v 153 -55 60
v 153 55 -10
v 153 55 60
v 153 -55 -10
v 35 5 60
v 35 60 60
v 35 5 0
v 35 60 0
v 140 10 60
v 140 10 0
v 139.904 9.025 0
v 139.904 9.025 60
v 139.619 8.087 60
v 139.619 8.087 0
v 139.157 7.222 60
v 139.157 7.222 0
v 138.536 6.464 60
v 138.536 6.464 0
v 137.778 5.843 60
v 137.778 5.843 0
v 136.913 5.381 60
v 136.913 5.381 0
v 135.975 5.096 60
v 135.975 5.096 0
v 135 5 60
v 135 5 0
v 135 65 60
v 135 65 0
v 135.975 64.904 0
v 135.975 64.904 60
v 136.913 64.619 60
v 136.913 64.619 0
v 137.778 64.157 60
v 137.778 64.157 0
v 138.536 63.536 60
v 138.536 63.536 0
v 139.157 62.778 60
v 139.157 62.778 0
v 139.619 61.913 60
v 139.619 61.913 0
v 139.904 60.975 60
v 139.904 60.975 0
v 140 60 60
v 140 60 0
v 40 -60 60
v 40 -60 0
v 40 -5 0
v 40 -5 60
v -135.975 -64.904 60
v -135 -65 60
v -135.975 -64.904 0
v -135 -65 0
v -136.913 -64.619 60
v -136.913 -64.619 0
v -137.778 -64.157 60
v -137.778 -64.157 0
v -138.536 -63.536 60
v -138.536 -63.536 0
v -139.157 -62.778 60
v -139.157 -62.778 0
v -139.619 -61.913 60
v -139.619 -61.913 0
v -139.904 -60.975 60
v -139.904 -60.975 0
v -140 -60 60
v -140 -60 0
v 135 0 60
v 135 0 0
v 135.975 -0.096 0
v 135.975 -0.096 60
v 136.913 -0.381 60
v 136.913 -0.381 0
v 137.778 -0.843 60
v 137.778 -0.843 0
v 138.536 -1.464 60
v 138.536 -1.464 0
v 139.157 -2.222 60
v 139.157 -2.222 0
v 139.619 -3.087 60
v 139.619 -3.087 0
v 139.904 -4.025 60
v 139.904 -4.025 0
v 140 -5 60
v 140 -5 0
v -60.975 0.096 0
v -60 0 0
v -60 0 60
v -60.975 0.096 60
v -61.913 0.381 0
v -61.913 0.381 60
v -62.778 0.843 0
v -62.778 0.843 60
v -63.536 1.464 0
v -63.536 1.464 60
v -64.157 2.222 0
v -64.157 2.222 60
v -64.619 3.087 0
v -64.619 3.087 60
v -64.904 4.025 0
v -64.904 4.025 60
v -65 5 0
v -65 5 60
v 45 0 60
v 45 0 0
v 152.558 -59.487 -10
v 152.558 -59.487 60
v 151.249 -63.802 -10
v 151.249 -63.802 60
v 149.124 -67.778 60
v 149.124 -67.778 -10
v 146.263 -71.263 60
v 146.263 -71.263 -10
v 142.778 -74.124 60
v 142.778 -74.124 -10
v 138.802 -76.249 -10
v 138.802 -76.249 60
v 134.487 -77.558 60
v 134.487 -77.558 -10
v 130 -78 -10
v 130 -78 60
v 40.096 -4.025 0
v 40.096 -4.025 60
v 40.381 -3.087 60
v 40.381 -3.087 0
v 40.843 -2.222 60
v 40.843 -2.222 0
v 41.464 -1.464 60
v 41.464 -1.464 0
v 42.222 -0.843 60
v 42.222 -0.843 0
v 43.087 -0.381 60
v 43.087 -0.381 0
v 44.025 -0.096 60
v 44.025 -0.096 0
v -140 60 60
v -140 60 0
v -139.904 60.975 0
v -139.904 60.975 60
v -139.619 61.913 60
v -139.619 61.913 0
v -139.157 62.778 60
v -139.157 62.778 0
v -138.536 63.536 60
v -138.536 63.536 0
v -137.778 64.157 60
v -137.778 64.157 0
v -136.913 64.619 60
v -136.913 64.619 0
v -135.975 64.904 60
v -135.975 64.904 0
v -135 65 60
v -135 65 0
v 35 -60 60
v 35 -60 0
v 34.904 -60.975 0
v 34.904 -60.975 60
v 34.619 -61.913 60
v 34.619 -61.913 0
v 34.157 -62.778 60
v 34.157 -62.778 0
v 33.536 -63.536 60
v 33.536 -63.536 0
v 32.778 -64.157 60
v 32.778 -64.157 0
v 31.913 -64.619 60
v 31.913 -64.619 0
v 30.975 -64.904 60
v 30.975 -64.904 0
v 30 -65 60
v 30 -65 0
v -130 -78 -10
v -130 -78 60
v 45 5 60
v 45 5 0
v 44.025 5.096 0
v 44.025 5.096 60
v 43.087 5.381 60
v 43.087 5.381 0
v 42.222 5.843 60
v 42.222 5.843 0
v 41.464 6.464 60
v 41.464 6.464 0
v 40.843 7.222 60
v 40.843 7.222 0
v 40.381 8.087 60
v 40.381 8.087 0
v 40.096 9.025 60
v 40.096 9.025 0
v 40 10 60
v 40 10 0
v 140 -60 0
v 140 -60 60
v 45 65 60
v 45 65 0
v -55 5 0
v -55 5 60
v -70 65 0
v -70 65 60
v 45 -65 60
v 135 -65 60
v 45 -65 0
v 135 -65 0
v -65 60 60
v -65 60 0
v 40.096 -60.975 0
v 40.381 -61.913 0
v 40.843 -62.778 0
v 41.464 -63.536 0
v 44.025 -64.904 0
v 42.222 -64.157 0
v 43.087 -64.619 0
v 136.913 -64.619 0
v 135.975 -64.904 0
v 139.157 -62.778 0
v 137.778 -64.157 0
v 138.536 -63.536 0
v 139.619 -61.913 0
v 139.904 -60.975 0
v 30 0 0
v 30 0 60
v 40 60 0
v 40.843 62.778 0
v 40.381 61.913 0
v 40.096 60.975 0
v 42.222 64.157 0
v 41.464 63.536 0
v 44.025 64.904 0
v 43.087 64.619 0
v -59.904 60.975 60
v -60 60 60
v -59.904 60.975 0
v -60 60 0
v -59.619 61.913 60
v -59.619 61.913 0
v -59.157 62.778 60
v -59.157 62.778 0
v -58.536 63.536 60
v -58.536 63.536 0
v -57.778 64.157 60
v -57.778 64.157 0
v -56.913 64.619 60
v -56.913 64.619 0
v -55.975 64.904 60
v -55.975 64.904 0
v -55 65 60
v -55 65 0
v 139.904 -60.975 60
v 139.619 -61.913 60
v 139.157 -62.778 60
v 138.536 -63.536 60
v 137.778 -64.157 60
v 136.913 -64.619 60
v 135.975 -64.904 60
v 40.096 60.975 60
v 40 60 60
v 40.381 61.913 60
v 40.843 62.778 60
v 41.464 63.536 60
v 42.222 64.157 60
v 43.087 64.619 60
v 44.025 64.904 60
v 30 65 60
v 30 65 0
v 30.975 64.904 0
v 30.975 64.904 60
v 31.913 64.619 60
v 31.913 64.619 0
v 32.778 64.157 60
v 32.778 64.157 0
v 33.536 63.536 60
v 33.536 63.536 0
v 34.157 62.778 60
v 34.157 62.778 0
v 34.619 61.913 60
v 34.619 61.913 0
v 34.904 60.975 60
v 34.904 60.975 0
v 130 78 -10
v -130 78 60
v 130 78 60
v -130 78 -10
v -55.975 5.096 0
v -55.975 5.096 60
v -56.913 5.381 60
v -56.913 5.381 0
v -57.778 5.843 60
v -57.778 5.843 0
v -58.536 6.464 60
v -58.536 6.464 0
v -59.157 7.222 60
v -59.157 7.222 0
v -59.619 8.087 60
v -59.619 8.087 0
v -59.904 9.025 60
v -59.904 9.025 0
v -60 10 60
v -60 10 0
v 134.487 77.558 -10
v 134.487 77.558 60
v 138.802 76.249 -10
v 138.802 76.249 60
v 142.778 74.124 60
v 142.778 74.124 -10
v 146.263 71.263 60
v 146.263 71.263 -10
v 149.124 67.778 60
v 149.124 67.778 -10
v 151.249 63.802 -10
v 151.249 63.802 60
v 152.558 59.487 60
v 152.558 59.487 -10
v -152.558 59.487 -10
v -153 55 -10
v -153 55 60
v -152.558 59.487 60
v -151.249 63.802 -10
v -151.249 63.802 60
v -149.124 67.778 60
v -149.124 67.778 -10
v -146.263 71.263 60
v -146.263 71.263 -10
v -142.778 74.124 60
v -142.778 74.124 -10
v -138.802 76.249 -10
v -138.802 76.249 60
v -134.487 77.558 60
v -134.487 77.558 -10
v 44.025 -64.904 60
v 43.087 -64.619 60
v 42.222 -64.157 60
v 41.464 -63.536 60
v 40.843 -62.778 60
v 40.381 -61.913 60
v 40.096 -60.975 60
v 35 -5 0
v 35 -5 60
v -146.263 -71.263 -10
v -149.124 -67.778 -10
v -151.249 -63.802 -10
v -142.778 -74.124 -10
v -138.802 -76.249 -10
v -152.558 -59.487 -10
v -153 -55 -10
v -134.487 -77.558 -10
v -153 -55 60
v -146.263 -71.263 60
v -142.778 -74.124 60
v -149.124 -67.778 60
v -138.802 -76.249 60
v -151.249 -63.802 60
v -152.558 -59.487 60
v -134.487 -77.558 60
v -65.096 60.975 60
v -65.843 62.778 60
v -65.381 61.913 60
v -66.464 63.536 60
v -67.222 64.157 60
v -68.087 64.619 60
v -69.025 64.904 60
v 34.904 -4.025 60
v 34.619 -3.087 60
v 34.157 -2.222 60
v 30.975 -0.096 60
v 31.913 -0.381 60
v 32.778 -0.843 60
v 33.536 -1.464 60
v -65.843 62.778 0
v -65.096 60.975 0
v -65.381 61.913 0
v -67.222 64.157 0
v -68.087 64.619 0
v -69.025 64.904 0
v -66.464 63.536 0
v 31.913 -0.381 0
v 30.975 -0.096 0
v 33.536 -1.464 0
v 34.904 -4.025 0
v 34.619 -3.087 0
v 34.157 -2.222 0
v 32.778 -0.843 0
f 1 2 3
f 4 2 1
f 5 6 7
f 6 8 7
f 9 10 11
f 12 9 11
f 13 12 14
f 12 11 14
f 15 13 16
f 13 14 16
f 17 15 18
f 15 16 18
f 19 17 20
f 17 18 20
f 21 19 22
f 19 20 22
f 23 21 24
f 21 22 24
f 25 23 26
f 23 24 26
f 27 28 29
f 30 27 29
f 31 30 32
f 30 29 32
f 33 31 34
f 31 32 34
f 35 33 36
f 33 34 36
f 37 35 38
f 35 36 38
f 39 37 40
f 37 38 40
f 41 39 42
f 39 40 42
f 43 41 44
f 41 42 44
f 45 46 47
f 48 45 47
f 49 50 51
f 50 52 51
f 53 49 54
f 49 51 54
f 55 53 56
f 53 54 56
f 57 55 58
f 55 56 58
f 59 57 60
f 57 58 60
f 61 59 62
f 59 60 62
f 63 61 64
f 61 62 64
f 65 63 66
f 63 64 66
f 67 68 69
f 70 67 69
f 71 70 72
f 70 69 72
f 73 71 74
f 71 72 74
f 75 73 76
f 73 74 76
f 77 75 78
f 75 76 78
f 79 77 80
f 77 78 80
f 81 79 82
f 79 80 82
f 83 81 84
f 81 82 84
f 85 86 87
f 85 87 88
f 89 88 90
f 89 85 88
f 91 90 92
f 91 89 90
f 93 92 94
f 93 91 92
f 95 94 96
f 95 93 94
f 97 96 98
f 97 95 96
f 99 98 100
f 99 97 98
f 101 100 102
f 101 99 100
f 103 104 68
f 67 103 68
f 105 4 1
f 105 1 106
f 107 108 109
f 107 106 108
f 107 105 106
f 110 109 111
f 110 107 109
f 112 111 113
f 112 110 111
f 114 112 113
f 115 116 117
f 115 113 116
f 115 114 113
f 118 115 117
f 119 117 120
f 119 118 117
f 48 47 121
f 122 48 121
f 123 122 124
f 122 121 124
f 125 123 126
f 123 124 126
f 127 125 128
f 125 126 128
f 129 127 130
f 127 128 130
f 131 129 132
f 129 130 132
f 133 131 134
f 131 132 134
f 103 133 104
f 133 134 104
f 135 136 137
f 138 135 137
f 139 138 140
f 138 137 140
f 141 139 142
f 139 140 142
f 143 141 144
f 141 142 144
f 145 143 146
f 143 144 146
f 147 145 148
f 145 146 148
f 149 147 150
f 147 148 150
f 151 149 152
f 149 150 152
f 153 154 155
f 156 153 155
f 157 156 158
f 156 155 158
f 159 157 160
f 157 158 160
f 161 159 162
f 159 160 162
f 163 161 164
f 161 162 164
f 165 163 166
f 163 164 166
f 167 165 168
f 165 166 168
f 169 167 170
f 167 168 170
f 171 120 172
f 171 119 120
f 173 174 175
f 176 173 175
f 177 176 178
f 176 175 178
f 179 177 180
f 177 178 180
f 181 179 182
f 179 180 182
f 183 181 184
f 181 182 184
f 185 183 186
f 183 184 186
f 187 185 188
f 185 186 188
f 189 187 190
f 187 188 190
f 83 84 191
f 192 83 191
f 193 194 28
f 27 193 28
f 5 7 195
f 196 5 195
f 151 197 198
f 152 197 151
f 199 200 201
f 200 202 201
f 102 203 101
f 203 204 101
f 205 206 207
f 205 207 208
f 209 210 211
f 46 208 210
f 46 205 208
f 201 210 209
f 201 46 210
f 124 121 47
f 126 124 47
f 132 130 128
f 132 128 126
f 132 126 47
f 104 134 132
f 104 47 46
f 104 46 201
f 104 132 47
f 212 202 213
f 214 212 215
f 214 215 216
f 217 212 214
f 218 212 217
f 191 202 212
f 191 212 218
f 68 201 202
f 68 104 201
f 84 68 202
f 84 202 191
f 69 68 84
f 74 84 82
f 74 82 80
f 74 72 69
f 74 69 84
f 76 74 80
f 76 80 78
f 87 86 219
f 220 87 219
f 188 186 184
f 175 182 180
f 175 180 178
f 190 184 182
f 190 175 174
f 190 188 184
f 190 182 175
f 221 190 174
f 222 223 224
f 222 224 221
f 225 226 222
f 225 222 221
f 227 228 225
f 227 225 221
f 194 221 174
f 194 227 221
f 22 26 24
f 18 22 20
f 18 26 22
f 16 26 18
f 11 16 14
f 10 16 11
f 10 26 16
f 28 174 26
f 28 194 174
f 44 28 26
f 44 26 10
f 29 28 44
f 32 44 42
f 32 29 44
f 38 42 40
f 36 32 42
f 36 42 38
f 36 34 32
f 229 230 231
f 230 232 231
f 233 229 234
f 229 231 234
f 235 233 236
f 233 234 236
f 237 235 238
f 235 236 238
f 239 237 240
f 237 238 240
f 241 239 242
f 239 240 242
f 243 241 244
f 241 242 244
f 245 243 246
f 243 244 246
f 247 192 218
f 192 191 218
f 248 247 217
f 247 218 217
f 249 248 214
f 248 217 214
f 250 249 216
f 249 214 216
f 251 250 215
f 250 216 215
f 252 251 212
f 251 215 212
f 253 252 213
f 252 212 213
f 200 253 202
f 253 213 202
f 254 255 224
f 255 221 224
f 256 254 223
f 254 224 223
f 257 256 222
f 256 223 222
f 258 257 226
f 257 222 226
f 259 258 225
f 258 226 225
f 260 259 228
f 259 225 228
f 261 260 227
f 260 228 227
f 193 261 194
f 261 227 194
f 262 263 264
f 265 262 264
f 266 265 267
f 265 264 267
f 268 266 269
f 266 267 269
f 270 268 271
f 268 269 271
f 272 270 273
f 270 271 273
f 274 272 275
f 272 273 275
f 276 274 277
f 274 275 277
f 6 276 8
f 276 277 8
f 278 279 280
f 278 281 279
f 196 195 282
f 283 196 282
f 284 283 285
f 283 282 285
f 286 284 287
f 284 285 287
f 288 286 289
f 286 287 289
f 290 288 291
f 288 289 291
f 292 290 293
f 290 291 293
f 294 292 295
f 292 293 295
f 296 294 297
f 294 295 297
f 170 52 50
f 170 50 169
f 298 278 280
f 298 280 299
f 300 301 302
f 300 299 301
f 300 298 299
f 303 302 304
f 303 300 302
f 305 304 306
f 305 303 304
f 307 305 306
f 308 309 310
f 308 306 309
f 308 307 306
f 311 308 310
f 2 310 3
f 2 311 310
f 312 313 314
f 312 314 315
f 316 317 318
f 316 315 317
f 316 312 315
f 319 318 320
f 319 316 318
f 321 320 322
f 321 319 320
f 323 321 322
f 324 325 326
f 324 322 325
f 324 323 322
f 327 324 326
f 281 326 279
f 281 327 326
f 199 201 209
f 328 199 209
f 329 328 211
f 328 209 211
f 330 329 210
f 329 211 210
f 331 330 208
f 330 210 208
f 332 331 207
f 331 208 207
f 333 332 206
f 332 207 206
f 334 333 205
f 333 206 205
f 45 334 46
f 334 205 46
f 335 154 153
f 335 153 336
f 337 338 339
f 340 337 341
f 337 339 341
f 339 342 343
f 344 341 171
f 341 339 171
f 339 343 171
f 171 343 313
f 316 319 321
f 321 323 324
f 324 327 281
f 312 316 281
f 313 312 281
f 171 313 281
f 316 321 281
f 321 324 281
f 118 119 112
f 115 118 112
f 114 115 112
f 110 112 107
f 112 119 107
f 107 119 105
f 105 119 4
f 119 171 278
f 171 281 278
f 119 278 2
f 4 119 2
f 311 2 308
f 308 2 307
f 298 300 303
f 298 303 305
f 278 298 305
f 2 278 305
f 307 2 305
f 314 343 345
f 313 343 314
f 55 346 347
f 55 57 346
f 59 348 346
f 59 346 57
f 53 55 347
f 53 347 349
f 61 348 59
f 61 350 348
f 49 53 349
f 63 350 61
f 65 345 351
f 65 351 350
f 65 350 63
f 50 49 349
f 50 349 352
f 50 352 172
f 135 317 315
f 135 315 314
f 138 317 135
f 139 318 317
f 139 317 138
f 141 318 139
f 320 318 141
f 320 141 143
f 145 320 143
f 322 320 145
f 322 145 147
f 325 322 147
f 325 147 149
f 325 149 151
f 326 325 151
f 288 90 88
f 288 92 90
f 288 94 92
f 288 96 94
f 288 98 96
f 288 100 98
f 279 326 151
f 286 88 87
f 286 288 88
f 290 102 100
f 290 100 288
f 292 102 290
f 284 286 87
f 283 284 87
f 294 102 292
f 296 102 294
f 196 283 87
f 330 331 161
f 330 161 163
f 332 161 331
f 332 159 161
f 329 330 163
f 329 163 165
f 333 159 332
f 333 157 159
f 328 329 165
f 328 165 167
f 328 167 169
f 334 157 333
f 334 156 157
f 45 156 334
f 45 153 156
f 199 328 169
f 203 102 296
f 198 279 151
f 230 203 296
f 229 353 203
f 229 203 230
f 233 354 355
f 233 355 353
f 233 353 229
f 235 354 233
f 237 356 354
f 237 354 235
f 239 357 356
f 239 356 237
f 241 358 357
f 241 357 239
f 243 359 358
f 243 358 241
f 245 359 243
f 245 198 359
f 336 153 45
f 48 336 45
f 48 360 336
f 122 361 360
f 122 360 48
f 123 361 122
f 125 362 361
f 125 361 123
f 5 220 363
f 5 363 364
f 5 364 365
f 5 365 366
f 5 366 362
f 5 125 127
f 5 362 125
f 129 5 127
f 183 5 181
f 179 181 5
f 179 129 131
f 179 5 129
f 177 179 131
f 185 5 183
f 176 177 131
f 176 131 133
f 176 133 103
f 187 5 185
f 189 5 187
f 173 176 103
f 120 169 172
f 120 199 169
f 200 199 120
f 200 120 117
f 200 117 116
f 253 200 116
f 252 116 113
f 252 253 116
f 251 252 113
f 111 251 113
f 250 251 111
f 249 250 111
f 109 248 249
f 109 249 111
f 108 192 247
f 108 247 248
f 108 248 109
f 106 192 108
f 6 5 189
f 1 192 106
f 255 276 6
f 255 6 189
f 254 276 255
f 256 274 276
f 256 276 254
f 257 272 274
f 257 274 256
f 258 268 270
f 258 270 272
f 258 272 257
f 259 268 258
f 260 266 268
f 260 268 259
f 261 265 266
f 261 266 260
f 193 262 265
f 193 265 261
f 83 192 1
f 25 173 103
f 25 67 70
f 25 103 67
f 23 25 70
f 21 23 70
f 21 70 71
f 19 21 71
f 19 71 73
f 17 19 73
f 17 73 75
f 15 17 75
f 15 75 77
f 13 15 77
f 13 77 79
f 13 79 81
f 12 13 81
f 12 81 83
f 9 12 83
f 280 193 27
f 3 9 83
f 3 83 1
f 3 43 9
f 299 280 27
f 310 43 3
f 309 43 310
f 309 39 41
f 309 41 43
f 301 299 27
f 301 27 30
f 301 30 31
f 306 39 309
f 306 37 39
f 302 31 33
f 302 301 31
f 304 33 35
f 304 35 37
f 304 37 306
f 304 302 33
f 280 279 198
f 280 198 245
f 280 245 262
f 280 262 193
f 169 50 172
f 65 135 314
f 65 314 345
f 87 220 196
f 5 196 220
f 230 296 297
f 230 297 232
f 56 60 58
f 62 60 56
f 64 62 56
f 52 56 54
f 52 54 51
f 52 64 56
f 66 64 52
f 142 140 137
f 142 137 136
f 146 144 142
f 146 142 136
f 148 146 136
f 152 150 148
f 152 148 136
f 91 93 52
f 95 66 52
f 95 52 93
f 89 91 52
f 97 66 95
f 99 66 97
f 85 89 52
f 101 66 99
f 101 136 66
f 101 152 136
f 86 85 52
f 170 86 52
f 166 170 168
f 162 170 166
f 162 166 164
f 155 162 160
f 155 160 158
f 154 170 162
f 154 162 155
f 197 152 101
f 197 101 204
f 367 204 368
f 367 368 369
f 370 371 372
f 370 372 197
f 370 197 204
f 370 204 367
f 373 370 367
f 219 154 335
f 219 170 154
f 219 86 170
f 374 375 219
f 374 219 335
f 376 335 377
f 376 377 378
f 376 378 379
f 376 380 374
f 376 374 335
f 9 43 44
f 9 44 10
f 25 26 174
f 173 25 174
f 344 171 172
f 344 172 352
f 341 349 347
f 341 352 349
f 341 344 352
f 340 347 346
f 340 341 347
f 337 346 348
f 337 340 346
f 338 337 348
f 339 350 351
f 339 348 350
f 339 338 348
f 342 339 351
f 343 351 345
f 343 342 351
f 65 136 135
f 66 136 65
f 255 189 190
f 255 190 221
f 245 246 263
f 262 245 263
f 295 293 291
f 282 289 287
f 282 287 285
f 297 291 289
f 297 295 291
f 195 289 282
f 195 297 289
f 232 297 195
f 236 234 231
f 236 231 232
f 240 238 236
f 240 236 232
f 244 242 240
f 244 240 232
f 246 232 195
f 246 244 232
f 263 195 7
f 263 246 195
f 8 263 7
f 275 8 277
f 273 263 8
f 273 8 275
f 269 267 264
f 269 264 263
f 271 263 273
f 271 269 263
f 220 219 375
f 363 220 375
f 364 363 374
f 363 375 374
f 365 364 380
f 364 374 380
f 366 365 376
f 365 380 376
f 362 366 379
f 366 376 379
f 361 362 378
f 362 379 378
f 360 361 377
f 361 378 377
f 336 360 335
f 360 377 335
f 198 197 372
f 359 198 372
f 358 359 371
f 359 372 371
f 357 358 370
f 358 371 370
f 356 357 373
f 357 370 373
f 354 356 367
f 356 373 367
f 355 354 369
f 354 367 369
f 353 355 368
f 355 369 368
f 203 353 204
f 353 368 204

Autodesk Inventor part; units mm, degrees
ref_plane "YZ Plane" through (0, 0, 0) normal (1, 0, 0) x (0, 1, 0)
ref_plane "XZ Plane" through (0, 0, 0) normal (0, 1, 0) x (-1, 0, 0)
ref_plane "XY Plane" through (0, 0, 0) normal (0, 0, 1) x (1, 0, 0)
sketch "Esboço4" plane through (0, 0, 0) normal (0, 0, 1) x (1, 0, 0)
  line L0 (-130, -75) -> (130, -75)
  line L1 (150, -55) -> (150, 55)
  line L2 (130, 75) -> (-130, 75)
  line L3 (-150, 55) -> (-150, -55)
  line L4 (-150, -75) -> (150, 75) construction
  line L5 (150, -75) -> (-150, 75) construction
  arc A0 (-130, 75) -> (-150, 55) centre (-130, 55) ccw
  arc A1 (-150, -55) -> (-130, -75) centre (-130, -55) ccw
  arc A2 (130, -75) -> (150, -55) centre (130, -55) ccw
  arc A3 (150, 55) -> (130, 75) centre (130, 55) ccw
  line L6 (-153, -55) -> (-153, 55)
  arc A4 (-130, 78) -> (-153, 55) centre (-130, 55) ccw
  line L7 (-130, 78) -> (130, 78)
  arc A5 (153, 55) -> (130, 78) centre (130, 55) ccw
  line L8 (153, 55) -> (153, -55)
  arc A6 (130, -78) -> (153, -55) centre (130, -55) ccw
  line L9 (130, -78) -> (-130, -78)
  arc A7 (-153, -55) -> (-130, -78) centre (-130, -55) ccw
  line L10 (45, 65) -> (135, 65)
  line L11 (140, 60) -> (140, 10)
  line L12 (135, 5) -> (45, 5)
  line L13 (40, 10) -> (40, 60)
  line L14 (135, 70) -> (35, 70)
  line L15 (35, 60) -> (35, 5)
  line L16 (45, 0) -> (135, 0)
  line L17 (145, -5) -> (145, 60)
  line L18 (40, 0) -> (140, 0)
  line L19 (145, -5) -> (145, -60)
  line L20 (135, -70) -> (30, -70)
  line L21 (35, -60) -> (35, -5)
  line L22 (140, -5) -> (140, -60)
  line L23 (135, -65) -> (45, -65)
  line L24 (40, -60) -> (40, -5)
  line L25 (35, 70) -> (-70, 70)
  line L26 (-65, 60) -> (-65, 5)
  line L27 (-60, 0) -> (30, 0)
  line L28 (35, 5) -> (-55, 5)
  line L29 (-60, 10) -> (-60, 60)
  line L30 (-55, 65) -> (30, 65)
  line L31 (30, -70) -> (-135, -70)
  line L32 (-145, -60) -> (-145, 60)
  line L33 (-135, 70) -> (-70, 70)
  line L34 (-70, 65) -> (-135, 65)
  line L35 (-140, 60) -> (-140, -60)
  line L36 (-135, -65) -> (30, -65)
  arc A8 (135, -70) -> (145, -60) centre (135, -60) ccw
  arc A9 (145, 60) -> (135, 70) centre (135, 60) ccw
  arc A10 (-135, 70) -> (-145, 60) centre (-135, 60) ccw
  arc A11 (-145, -60) -> (-135, -70) centre (-135, -60) ccw
  arc A12 (-65, 5) -> (-60, 0) centre (-60, 5) ccw
  arc A13 (-60, 10) -> (-55, 5) centre (-55, 10) ccw
  arc A14 (40, 10) -> (45, 5) centre (45, 10) ccw
  arc A15 (35, -5) -> (30, 0) centre (30, -5) ccw
  arc A16 (45, 0) -> (40, -5) centre (45, -5) ccw
  arc A17 (35, 60) -> (30, 65) centre (30, 60) ccw
  arc A18 (45, 65) -> (40, 60) centre (45, 60) ccw
  arc A19 (-55, 65) -> (-60, 60) centre (-55, 60) ccw
  arc A20 (-65, 60) -> (-70, 65) centre (-70, 60) ccw
  arc A21 (140, 60) -> (135, 65) centre (135, 60) ccw
  arc A22 (135, 5) -> (140, 10) centre (135, 10) ccw
  arc A23 (140, -5) -> (135, 0) centre (135, -5) ccw
  arc A24 (135, -65) -> (140, -60) centre (135, -60) ccw
  arc A25 (40, -60) -> (45, -65) centre (45, -60) ccw
  arc A26 (30, -65) -> (35, -60) centre (30, -60) ccw
  arc A27 (-140, -60) -> (-135, -65) centre (-135, -60) ccw
  arc A28 (-135, 65) -> (-140, 60) centre (-135, 60) ccw
  point P0 (0, 0)
  point P1 (40, 65)
  point P2 (140, 5)
  point P3 (140, 65)
  point P4 (40, 5)
  point P5 (35, 0)
  point P6 (140, -65)
  point P7 (40, -65)
  point P8 (-65, 0)
  point P9 (-60, 5)
  point P10 (-60, 65)
  point P11 (-140, 65)
  point P12 (-140, -65)
  point P13 (35, 65)
  point P14 (35, -65)
  point P15 (-65, 65)
  point P16 (35, -11.1171)
  dimension "d13" = 150
  dimension "d14" = 300
  dimension "d17" = 20
  dimension "d18" = 20
  dimension "d19" = 3
  dimension "d20" = 60
  dimension "d21" = 100
  dimension "d25" = 5
  dimension "d26" = 5
  dimension "d27" = 5
  dimension "d28" = 5
  dimension "d31" = 5
  dimension "d32" = 5
  dimension "d33" = 5
  dimension "d38" = 100
  dimension "d39" = 5
  dimension "d41" = 5
  dimension "d42" = 5
  dimension "d43" = 5
  dimension "d44" = 5
  dimension "d47" = 5
  dimension "d49" = 100
  dimension "d50" = 5
  dimension "d57" = 10
  dimension "d62" = 60
  dimension "d63" = 5
  dimension "d64" = 5
extrude "Extrusão4" add sketch "Esboço4" along normal blind 60 contours A1 L3 A0 L2 A3 L1 A2 L0 | L6 A4 L7 A5 L8 A6 L9 A7 | L10 A21 L11 A22 L12 A14 L13 A18 | A9 L17 L19 A8 L20 L31 A11 L32 A10 L33 L25 L14 | L15 L28 A13 L29 A19 L30 A17 | L16 A23 L22 A24 L23 A25 L24 A16 | A26 L36 A27 L35 A28 L34 A20 L26 A12 L27 A15 L21
extrude "Extrusão5" cut sketch "Esboço4" along normal blind 80 contours L10 A21 L11 A22 L12 A14 L13 A18 | L15 L28 A13 L29 A19 L30 A17 | L16 A23 L22 A24 L23 A25 L24 A16 | A26 L36 A27 L35 A28 L34 A20 L26 A12 L27 A15 L21
extrude "Extrusão6" add sketch "Esboço4" against normal blind 10 contours A1 L3 A0 L2 A3 L1 A2 L0 | L6 A4 L7 A5 L8 A6 L9 A7 | L10 A21 L11 A22 L12 A14 L13 A18 | A9 L17 L19 A8 L20 L31 A11 L32 A10 L33 L25 L14 | L15 L28 A13 L29 A19 L30 A17 | L16 A23 L22 A24 L23 A25 L24 A16 | A26 L36 A27 L35 A28 L34 A20 L26 A12 L27 A15 L21
sketch "Esboço1" plane through (0, 0, 0) normal (0, 0, 1) x (1, 0, 0)
  line L0 (-25, -12.5) -> (25, -12.5)
  line L1 (25, -12.5) -> (25, 12.5)
  line L2 (25, 12.5) -> (-25, 12.5)
  line L3 (-25, 12.5) -> (-25, -12.5)
  line L4 (-25, -12.5) -> (25, 12.5) construction
  line L5 (25, -12.5) -> (-25, 12.5) construction
  point P0 (0, 0)
  dimension "d0" = 25
  dimension "d1" = 50
sketch "Esboço2" plane through (0, 0, 100) normal (0, 0, 1) x (1, 0, 0)
  line L0 (25, -12.5) -> (25, 12.5) projected
  line L1 (25, 12.5) -> (-25, 12.5) projected
  line L2 (-25, 12.5) -> (-25, -12.5) projected
  line L3 (-25, -12.5) -> (25, -12.5) projected
  line L4 (-27, 14.5) -> (27, 14.5)
  line L5 (27, 14.5) -> (27, -14.5)
  line L6 (27, -14.5) -> (-27, -14.5)
  line L7 (-27, -14.5) -> (-27, 14.5)
  point P0 (0, 0)
  dimension "d4" = 2
properties part number "prototipo"
